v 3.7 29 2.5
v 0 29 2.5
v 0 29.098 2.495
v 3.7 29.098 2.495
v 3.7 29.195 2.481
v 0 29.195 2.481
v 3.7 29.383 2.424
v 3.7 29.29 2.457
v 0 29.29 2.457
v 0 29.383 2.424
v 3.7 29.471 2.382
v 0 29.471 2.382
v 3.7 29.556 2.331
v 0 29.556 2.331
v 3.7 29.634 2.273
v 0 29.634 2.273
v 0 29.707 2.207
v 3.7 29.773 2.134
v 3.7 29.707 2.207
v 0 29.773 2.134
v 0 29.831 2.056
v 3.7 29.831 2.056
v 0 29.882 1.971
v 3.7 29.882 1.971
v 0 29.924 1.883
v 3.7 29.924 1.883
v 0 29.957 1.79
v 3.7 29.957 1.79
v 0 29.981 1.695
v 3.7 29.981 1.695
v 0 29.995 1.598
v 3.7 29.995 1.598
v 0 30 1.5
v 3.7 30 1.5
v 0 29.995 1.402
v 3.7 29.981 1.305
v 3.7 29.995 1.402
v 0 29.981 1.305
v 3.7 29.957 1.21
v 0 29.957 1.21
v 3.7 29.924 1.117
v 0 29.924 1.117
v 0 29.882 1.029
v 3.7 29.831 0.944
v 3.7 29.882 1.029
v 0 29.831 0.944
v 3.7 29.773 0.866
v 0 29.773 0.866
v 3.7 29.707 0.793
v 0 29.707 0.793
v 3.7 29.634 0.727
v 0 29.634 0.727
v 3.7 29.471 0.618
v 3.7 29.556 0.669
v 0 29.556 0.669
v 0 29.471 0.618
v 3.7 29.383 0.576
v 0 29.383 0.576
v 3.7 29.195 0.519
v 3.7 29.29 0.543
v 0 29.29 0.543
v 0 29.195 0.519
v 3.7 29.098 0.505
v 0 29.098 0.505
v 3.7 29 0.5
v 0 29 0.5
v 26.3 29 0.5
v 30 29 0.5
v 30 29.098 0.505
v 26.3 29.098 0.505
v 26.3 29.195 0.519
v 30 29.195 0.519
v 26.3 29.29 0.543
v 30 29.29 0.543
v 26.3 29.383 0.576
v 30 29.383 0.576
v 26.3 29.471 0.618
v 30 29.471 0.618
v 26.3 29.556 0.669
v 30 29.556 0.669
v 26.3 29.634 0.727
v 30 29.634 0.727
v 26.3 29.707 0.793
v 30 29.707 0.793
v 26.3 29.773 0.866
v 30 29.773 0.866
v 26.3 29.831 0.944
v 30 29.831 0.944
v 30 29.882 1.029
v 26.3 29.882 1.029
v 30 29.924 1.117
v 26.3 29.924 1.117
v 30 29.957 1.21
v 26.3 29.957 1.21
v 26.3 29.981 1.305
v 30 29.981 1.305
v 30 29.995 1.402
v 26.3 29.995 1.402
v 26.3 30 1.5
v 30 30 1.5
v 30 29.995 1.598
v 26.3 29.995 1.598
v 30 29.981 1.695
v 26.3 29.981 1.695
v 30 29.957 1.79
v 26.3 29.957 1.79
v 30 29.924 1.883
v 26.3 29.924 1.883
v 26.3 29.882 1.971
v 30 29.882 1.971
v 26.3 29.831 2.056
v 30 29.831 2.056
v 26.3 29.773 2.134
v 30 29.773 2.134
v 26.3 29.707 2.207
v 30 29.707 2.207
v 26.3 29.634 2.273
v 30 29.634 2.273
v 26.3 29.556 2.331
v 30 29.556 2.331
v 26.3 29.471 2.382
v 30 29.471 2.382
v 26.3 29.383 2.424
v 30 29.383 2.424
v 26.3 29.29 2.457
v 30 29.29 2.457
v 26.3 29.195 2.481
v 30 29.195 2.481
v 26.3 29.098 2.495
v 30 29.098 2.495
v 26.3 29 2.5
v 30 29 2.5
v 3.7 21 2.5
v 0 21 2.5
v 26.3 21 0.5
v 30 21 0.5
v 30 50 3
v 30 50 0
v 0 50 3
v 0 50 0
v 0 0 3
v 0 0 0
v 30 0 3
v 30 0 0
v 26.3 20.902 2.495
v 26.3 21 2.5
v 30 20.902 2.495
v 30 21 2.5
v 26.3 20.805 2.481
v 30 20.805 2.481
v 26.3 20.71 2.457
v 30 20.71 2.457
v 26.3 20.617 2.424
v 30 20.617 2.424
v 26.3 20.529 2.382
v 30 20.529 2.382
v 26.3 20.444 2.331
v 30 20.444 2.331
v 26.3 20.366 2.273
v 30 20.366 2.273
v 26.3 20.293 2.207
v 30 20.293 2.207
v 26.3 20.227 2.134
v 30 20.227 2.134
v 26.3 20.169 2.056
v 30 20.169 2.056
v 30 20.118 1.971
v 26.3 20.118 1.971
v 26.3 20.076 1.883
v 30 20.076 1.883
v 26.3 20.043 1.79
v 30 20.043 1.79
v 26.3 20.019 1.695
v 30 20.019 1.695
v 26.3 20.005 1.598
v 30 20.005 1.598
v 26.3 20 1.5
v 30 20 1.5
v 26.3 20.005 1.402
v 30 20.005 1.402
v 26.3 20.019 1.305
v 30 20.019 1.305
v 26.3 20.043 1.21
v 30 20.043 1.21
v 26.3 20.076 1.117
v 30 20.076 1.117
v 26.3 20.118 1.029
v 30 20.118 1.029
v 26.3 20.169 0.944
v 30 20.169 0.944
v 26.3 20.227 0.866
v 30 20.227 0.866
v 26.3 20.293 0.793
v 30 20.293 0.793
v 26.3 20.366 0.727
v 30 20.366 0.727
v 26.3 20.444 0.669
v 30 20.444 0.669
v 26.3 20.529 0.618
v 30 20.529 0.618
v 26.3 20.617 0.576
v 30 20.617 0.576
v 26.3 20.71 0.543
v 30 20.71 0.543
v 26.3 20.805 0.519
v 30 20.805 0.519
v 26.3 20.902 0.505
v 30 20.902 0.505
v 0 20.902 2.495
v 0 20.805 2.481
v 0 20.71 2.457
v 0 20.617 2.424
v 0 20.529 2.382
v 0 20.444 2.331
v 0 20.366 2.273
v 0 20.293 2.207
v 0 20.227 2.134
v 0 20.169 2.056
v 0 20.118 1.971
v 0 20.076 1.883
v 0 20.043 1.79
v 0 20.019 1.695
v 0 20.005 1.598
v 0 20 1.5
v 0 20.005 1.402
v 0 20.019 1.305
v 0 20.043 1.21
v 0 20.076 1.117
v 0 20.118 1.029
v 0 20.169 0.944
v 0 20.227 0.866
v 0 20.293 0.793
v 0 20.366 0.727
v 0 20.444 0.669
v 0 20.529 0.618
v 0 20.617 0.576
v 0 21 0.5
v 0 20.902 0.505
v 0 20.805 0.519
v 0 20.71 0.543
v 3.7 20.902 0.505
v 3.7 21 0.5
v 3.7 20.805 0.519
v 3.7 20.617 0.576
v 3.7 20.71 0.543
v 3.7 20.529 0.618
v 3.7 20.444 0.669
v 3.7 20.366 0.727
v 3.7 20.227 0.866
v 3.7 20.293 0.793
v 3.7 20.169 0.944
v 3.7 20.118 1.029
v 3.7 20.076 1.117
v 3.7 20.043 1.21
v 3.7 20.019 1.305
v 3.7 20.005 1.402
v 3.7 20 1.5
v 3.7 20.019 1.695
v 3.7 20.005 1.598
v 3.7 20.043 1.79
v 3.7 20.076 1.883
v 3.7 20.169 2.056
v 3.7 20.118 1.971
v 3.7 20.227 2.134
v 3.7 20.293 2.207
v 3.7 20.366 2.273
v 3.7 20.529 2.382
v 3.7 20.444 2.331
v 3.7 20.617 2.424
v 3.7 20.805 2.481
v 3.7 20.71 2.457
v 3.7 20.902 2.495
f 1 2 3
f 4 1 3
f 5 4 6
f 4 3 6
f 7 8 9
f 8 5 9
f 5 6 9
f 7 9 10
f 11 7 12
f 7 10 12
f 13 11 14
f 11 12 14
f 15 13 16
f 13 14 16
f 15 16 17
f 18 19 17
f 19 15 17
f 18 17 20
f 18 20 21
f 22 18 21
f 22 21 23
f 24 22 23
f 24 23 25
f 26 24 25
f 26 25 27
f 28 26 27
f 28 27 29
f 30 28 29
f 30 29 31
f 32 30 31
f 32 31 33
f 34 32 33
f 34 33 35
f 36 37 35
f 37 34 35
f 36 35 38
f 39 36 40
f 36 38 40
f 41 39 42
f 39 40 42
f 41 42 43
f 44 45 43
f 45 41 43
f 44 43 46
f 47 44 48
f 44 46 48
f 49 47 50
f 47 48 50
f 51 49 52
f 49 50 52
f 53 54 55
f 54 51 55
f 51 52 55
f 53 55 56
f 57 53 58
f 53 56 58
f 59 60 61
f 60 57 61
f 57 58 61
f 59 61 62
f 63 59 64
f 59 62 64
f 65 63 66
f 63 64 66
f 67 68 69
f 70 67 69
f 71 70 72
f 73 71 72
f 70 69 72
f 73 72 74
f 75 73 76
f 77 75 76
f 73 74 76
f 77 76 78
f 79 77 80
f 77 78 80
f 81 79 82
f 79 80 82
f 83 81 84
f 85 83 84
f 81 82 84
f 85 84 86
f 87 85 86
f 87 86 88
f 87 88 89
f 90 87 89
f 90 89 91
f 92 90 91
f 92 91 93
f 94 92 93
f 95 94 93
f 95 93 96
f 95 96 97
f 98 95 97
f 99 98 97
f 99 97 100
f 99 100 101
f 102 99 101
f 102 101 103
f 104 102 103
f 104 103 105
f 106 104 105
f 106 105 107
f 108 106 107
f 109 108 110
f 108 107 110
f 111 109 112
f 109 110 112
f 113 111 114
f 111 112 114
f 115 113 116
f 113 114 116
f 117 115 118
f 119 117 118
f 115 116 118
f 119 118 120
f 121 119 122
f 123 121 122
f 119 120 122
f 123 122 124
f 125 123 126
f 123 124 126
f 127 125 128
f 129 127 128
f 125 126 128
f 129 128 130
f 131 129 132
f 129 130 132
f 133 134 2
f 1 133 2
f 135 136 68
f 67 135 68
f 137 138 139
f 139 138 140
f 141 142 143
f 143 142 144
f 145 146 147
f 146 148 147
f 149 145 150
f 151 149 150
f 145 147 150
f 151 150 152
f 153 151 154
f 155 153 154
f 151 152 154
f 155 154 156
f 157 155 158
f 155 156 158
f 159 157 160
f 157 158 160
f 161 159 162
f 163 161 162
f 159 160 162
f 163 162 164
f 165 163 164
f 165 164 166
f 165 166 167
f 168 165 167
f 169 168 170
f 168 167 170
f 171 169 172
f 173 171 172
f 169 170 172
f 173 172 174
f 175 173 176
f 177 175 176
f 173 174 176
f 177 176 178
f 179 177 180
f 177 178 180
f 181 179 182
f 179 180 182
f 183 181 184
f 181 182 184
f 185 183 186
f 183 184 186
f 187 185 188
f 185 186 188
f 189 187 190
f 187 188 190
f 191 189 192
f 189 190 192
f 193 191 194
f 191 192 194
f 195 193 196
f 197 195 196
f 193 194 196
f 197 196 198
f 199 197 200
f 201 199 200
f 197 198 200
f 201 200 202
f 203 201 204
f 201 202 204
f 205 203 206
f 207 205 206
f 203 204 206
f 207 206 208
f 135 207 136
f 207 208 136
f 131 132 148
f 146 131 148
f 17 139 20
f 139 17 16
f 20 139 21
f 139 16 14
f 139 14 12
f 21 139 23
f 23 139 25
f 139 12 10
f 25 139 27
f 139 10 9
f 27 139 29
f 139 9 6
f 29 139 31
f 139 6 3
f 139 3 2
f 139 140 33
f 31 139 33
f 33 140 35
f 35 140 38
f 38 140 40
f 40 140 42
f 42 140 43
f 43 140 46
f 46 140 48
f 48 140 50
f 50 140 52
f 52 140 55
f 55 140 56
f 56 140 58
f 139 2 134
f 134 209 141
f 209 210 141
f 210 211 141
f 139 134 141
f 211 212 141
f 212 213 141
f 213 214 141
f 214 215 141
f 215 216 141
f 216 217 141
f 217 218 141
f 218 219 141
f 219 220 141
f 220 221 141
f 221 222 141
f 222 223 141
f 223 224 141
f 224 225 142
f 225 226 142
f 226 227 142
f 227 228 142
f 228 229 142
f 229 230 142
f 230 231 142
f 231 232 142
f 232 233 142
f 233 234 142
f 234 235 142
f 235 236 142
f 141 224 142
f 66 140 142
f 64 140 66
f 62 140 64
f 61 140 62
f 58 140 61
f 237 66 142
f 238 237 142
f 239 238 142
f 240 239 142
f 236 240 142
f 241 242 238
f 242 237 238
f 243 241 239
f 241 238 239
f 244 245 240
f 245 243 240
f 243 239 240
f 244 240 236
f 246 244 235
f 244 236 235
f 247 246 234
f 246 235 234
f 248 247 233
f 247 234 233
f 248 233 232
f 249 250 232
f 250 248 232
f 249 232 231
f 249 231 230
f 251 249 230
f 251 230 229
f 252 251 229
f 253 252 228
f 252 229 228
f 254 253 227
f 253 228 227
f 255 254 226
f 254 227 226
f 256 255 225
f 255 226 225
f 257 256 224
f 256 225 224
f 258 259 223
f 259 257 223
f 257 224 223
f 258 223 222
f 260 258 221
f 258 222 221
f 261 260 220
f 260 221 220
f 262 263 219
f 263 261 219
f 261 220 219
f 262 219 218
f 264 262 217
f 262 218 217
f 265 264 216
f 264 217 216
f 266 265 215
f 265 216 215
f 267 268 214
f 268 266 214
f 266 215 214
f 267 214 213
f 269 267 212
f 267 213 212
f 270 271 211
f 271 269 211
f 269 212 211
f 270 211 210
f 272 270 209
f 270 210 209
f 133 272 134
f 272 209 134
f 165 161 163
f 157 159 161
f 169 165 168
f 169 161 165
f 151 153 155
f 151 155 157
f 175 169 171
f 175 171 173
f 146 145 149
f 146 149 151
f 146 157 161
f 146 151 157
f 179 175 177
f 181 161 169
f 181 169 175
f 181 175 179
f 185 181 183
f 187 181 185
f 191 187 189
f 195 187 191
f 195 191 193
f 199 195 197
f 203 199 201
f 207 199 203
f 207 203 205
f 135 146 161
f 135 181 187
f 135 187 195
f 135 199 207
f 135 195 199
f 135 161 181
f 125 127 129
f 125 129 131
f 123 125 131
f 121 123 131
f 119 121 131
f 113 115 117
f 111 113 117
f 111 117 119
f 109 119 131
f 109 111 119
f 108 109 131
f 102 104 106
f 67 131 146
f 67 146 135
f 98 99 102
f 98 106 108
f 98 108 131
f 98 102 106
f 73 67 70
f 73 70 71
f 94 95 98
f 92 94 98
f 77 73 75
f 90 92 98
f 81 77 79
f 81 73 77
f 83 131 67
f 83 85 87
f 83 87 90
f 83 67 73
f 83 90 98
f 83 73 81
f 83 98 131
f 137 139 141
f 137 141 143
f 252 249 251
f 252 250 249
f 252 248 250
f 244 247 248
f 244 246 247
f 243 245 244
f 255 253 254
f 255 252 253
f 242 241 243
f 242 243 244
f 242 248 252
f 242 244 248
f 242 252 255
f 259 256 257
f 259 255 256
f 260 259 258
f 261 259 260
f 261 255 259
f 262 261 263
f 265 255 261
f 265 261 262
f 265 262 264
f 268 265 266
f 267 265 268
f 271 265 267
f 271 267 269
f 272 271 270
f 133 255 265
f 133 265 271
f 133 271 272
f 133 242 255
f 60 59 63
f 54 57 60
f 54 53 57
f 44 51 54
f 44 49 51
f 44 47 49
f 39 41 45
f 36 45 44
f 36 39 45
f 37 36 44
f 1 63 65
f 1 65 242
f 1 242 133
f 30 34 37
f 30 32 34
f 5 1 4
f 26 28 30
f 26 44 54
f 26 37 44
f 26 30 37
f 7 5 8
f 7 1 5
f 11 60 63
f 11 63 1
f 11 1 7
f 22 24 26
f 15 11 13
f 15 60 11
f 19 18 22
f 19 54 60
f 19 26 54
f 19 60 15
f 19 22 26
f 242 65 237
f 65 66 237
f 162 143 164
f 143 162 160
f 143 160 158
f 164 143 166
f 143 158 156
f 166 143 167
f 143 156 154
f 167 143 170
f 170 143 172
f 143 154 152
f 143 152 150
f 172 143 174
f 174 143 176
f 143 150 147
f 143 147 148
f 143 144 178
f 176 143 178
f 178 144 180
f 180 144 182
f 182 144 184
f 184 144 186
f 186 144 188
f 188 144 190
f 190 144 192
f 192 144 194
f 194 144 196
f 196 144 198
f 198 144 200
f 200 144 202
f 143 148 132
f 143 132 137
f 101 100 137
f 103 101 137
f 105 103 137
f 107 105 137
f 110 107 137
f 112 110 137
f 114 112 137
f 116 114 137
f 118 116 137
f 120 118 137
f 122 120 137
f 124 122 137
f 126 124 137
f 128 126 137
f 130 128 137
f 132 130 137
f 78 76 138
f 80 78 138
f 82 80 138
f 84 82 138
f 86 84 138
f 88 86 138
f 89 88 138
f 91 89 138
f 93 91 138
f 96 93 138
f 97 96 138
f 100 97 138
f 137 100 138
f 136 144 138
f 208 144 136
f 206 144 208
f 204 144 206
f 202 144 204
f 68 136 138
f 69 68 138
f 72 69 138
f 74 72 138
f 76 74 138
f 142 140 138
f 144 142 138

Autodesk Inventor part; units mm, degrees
ref_plane "YZ Plane" through (0, 0, 0) normal (1, 0, 0) x (0, 1, 0)
ref_plane "XZ Plane" through (0, 0, 0) normal (0, 1, 0) x (-1, 0, 0)
sketch "Sketch1" plane through (0, 0, 0) normal (0, 0, 1) x (1, 0, 0)
  line L0 (0, 0) -> (30, 0)
  line L1 (30, 0) -> (30, 50)
  line L2 (30, 50) -> (0, 50)
  line L3 (0, 50) -> (0, 0)
  dimension "d0" = 30
  dimension "d1" = 50
extrude "Extrusion1" add sketch "Sketch1" along normal blind 3
sketch "Sketch2" plane through (30, 0, 0) normal (1, 0, 0) x (0, 0, -1)
  line L0 (-1.5, 30) -> (-1.5, 20) construction
  line L1 (-3, 0) -> (-3, 50) projected
  line L2 (-2.5, 29) -> (-2.5, 21)
  line L3 (-0.5, 21) -> (-0.5, 29)
  arc A0 (-0.5, 29) -> (-2.5, 29) centre (-1.5, 29) ccw
  arc A1 (-2.5, 21) -> (-0.5, 21) centre (-1.5, 21) ccw
  line L4 (0, 0) -> (0, 50) projected
  point P0 (-1.5, 25)
  point P1 (0, 25)
  dimension "d12" = 25
  dimension "d13" = 1
  dimension "d14" = 10
  dimension "d15" = 1.5
extrude "Extrusion2" cut sketch "Sketch2" against normal blind 3.7
ref_plane "Work Plane1" through (15, 0, 0) normal (1, 0, 0) x (0, 0, -1)
mirror "Mirror1" about plane through (15, 0, 0) normal (1, 0, 0) of "Extrusion2"
properties part number "motor box 2"
